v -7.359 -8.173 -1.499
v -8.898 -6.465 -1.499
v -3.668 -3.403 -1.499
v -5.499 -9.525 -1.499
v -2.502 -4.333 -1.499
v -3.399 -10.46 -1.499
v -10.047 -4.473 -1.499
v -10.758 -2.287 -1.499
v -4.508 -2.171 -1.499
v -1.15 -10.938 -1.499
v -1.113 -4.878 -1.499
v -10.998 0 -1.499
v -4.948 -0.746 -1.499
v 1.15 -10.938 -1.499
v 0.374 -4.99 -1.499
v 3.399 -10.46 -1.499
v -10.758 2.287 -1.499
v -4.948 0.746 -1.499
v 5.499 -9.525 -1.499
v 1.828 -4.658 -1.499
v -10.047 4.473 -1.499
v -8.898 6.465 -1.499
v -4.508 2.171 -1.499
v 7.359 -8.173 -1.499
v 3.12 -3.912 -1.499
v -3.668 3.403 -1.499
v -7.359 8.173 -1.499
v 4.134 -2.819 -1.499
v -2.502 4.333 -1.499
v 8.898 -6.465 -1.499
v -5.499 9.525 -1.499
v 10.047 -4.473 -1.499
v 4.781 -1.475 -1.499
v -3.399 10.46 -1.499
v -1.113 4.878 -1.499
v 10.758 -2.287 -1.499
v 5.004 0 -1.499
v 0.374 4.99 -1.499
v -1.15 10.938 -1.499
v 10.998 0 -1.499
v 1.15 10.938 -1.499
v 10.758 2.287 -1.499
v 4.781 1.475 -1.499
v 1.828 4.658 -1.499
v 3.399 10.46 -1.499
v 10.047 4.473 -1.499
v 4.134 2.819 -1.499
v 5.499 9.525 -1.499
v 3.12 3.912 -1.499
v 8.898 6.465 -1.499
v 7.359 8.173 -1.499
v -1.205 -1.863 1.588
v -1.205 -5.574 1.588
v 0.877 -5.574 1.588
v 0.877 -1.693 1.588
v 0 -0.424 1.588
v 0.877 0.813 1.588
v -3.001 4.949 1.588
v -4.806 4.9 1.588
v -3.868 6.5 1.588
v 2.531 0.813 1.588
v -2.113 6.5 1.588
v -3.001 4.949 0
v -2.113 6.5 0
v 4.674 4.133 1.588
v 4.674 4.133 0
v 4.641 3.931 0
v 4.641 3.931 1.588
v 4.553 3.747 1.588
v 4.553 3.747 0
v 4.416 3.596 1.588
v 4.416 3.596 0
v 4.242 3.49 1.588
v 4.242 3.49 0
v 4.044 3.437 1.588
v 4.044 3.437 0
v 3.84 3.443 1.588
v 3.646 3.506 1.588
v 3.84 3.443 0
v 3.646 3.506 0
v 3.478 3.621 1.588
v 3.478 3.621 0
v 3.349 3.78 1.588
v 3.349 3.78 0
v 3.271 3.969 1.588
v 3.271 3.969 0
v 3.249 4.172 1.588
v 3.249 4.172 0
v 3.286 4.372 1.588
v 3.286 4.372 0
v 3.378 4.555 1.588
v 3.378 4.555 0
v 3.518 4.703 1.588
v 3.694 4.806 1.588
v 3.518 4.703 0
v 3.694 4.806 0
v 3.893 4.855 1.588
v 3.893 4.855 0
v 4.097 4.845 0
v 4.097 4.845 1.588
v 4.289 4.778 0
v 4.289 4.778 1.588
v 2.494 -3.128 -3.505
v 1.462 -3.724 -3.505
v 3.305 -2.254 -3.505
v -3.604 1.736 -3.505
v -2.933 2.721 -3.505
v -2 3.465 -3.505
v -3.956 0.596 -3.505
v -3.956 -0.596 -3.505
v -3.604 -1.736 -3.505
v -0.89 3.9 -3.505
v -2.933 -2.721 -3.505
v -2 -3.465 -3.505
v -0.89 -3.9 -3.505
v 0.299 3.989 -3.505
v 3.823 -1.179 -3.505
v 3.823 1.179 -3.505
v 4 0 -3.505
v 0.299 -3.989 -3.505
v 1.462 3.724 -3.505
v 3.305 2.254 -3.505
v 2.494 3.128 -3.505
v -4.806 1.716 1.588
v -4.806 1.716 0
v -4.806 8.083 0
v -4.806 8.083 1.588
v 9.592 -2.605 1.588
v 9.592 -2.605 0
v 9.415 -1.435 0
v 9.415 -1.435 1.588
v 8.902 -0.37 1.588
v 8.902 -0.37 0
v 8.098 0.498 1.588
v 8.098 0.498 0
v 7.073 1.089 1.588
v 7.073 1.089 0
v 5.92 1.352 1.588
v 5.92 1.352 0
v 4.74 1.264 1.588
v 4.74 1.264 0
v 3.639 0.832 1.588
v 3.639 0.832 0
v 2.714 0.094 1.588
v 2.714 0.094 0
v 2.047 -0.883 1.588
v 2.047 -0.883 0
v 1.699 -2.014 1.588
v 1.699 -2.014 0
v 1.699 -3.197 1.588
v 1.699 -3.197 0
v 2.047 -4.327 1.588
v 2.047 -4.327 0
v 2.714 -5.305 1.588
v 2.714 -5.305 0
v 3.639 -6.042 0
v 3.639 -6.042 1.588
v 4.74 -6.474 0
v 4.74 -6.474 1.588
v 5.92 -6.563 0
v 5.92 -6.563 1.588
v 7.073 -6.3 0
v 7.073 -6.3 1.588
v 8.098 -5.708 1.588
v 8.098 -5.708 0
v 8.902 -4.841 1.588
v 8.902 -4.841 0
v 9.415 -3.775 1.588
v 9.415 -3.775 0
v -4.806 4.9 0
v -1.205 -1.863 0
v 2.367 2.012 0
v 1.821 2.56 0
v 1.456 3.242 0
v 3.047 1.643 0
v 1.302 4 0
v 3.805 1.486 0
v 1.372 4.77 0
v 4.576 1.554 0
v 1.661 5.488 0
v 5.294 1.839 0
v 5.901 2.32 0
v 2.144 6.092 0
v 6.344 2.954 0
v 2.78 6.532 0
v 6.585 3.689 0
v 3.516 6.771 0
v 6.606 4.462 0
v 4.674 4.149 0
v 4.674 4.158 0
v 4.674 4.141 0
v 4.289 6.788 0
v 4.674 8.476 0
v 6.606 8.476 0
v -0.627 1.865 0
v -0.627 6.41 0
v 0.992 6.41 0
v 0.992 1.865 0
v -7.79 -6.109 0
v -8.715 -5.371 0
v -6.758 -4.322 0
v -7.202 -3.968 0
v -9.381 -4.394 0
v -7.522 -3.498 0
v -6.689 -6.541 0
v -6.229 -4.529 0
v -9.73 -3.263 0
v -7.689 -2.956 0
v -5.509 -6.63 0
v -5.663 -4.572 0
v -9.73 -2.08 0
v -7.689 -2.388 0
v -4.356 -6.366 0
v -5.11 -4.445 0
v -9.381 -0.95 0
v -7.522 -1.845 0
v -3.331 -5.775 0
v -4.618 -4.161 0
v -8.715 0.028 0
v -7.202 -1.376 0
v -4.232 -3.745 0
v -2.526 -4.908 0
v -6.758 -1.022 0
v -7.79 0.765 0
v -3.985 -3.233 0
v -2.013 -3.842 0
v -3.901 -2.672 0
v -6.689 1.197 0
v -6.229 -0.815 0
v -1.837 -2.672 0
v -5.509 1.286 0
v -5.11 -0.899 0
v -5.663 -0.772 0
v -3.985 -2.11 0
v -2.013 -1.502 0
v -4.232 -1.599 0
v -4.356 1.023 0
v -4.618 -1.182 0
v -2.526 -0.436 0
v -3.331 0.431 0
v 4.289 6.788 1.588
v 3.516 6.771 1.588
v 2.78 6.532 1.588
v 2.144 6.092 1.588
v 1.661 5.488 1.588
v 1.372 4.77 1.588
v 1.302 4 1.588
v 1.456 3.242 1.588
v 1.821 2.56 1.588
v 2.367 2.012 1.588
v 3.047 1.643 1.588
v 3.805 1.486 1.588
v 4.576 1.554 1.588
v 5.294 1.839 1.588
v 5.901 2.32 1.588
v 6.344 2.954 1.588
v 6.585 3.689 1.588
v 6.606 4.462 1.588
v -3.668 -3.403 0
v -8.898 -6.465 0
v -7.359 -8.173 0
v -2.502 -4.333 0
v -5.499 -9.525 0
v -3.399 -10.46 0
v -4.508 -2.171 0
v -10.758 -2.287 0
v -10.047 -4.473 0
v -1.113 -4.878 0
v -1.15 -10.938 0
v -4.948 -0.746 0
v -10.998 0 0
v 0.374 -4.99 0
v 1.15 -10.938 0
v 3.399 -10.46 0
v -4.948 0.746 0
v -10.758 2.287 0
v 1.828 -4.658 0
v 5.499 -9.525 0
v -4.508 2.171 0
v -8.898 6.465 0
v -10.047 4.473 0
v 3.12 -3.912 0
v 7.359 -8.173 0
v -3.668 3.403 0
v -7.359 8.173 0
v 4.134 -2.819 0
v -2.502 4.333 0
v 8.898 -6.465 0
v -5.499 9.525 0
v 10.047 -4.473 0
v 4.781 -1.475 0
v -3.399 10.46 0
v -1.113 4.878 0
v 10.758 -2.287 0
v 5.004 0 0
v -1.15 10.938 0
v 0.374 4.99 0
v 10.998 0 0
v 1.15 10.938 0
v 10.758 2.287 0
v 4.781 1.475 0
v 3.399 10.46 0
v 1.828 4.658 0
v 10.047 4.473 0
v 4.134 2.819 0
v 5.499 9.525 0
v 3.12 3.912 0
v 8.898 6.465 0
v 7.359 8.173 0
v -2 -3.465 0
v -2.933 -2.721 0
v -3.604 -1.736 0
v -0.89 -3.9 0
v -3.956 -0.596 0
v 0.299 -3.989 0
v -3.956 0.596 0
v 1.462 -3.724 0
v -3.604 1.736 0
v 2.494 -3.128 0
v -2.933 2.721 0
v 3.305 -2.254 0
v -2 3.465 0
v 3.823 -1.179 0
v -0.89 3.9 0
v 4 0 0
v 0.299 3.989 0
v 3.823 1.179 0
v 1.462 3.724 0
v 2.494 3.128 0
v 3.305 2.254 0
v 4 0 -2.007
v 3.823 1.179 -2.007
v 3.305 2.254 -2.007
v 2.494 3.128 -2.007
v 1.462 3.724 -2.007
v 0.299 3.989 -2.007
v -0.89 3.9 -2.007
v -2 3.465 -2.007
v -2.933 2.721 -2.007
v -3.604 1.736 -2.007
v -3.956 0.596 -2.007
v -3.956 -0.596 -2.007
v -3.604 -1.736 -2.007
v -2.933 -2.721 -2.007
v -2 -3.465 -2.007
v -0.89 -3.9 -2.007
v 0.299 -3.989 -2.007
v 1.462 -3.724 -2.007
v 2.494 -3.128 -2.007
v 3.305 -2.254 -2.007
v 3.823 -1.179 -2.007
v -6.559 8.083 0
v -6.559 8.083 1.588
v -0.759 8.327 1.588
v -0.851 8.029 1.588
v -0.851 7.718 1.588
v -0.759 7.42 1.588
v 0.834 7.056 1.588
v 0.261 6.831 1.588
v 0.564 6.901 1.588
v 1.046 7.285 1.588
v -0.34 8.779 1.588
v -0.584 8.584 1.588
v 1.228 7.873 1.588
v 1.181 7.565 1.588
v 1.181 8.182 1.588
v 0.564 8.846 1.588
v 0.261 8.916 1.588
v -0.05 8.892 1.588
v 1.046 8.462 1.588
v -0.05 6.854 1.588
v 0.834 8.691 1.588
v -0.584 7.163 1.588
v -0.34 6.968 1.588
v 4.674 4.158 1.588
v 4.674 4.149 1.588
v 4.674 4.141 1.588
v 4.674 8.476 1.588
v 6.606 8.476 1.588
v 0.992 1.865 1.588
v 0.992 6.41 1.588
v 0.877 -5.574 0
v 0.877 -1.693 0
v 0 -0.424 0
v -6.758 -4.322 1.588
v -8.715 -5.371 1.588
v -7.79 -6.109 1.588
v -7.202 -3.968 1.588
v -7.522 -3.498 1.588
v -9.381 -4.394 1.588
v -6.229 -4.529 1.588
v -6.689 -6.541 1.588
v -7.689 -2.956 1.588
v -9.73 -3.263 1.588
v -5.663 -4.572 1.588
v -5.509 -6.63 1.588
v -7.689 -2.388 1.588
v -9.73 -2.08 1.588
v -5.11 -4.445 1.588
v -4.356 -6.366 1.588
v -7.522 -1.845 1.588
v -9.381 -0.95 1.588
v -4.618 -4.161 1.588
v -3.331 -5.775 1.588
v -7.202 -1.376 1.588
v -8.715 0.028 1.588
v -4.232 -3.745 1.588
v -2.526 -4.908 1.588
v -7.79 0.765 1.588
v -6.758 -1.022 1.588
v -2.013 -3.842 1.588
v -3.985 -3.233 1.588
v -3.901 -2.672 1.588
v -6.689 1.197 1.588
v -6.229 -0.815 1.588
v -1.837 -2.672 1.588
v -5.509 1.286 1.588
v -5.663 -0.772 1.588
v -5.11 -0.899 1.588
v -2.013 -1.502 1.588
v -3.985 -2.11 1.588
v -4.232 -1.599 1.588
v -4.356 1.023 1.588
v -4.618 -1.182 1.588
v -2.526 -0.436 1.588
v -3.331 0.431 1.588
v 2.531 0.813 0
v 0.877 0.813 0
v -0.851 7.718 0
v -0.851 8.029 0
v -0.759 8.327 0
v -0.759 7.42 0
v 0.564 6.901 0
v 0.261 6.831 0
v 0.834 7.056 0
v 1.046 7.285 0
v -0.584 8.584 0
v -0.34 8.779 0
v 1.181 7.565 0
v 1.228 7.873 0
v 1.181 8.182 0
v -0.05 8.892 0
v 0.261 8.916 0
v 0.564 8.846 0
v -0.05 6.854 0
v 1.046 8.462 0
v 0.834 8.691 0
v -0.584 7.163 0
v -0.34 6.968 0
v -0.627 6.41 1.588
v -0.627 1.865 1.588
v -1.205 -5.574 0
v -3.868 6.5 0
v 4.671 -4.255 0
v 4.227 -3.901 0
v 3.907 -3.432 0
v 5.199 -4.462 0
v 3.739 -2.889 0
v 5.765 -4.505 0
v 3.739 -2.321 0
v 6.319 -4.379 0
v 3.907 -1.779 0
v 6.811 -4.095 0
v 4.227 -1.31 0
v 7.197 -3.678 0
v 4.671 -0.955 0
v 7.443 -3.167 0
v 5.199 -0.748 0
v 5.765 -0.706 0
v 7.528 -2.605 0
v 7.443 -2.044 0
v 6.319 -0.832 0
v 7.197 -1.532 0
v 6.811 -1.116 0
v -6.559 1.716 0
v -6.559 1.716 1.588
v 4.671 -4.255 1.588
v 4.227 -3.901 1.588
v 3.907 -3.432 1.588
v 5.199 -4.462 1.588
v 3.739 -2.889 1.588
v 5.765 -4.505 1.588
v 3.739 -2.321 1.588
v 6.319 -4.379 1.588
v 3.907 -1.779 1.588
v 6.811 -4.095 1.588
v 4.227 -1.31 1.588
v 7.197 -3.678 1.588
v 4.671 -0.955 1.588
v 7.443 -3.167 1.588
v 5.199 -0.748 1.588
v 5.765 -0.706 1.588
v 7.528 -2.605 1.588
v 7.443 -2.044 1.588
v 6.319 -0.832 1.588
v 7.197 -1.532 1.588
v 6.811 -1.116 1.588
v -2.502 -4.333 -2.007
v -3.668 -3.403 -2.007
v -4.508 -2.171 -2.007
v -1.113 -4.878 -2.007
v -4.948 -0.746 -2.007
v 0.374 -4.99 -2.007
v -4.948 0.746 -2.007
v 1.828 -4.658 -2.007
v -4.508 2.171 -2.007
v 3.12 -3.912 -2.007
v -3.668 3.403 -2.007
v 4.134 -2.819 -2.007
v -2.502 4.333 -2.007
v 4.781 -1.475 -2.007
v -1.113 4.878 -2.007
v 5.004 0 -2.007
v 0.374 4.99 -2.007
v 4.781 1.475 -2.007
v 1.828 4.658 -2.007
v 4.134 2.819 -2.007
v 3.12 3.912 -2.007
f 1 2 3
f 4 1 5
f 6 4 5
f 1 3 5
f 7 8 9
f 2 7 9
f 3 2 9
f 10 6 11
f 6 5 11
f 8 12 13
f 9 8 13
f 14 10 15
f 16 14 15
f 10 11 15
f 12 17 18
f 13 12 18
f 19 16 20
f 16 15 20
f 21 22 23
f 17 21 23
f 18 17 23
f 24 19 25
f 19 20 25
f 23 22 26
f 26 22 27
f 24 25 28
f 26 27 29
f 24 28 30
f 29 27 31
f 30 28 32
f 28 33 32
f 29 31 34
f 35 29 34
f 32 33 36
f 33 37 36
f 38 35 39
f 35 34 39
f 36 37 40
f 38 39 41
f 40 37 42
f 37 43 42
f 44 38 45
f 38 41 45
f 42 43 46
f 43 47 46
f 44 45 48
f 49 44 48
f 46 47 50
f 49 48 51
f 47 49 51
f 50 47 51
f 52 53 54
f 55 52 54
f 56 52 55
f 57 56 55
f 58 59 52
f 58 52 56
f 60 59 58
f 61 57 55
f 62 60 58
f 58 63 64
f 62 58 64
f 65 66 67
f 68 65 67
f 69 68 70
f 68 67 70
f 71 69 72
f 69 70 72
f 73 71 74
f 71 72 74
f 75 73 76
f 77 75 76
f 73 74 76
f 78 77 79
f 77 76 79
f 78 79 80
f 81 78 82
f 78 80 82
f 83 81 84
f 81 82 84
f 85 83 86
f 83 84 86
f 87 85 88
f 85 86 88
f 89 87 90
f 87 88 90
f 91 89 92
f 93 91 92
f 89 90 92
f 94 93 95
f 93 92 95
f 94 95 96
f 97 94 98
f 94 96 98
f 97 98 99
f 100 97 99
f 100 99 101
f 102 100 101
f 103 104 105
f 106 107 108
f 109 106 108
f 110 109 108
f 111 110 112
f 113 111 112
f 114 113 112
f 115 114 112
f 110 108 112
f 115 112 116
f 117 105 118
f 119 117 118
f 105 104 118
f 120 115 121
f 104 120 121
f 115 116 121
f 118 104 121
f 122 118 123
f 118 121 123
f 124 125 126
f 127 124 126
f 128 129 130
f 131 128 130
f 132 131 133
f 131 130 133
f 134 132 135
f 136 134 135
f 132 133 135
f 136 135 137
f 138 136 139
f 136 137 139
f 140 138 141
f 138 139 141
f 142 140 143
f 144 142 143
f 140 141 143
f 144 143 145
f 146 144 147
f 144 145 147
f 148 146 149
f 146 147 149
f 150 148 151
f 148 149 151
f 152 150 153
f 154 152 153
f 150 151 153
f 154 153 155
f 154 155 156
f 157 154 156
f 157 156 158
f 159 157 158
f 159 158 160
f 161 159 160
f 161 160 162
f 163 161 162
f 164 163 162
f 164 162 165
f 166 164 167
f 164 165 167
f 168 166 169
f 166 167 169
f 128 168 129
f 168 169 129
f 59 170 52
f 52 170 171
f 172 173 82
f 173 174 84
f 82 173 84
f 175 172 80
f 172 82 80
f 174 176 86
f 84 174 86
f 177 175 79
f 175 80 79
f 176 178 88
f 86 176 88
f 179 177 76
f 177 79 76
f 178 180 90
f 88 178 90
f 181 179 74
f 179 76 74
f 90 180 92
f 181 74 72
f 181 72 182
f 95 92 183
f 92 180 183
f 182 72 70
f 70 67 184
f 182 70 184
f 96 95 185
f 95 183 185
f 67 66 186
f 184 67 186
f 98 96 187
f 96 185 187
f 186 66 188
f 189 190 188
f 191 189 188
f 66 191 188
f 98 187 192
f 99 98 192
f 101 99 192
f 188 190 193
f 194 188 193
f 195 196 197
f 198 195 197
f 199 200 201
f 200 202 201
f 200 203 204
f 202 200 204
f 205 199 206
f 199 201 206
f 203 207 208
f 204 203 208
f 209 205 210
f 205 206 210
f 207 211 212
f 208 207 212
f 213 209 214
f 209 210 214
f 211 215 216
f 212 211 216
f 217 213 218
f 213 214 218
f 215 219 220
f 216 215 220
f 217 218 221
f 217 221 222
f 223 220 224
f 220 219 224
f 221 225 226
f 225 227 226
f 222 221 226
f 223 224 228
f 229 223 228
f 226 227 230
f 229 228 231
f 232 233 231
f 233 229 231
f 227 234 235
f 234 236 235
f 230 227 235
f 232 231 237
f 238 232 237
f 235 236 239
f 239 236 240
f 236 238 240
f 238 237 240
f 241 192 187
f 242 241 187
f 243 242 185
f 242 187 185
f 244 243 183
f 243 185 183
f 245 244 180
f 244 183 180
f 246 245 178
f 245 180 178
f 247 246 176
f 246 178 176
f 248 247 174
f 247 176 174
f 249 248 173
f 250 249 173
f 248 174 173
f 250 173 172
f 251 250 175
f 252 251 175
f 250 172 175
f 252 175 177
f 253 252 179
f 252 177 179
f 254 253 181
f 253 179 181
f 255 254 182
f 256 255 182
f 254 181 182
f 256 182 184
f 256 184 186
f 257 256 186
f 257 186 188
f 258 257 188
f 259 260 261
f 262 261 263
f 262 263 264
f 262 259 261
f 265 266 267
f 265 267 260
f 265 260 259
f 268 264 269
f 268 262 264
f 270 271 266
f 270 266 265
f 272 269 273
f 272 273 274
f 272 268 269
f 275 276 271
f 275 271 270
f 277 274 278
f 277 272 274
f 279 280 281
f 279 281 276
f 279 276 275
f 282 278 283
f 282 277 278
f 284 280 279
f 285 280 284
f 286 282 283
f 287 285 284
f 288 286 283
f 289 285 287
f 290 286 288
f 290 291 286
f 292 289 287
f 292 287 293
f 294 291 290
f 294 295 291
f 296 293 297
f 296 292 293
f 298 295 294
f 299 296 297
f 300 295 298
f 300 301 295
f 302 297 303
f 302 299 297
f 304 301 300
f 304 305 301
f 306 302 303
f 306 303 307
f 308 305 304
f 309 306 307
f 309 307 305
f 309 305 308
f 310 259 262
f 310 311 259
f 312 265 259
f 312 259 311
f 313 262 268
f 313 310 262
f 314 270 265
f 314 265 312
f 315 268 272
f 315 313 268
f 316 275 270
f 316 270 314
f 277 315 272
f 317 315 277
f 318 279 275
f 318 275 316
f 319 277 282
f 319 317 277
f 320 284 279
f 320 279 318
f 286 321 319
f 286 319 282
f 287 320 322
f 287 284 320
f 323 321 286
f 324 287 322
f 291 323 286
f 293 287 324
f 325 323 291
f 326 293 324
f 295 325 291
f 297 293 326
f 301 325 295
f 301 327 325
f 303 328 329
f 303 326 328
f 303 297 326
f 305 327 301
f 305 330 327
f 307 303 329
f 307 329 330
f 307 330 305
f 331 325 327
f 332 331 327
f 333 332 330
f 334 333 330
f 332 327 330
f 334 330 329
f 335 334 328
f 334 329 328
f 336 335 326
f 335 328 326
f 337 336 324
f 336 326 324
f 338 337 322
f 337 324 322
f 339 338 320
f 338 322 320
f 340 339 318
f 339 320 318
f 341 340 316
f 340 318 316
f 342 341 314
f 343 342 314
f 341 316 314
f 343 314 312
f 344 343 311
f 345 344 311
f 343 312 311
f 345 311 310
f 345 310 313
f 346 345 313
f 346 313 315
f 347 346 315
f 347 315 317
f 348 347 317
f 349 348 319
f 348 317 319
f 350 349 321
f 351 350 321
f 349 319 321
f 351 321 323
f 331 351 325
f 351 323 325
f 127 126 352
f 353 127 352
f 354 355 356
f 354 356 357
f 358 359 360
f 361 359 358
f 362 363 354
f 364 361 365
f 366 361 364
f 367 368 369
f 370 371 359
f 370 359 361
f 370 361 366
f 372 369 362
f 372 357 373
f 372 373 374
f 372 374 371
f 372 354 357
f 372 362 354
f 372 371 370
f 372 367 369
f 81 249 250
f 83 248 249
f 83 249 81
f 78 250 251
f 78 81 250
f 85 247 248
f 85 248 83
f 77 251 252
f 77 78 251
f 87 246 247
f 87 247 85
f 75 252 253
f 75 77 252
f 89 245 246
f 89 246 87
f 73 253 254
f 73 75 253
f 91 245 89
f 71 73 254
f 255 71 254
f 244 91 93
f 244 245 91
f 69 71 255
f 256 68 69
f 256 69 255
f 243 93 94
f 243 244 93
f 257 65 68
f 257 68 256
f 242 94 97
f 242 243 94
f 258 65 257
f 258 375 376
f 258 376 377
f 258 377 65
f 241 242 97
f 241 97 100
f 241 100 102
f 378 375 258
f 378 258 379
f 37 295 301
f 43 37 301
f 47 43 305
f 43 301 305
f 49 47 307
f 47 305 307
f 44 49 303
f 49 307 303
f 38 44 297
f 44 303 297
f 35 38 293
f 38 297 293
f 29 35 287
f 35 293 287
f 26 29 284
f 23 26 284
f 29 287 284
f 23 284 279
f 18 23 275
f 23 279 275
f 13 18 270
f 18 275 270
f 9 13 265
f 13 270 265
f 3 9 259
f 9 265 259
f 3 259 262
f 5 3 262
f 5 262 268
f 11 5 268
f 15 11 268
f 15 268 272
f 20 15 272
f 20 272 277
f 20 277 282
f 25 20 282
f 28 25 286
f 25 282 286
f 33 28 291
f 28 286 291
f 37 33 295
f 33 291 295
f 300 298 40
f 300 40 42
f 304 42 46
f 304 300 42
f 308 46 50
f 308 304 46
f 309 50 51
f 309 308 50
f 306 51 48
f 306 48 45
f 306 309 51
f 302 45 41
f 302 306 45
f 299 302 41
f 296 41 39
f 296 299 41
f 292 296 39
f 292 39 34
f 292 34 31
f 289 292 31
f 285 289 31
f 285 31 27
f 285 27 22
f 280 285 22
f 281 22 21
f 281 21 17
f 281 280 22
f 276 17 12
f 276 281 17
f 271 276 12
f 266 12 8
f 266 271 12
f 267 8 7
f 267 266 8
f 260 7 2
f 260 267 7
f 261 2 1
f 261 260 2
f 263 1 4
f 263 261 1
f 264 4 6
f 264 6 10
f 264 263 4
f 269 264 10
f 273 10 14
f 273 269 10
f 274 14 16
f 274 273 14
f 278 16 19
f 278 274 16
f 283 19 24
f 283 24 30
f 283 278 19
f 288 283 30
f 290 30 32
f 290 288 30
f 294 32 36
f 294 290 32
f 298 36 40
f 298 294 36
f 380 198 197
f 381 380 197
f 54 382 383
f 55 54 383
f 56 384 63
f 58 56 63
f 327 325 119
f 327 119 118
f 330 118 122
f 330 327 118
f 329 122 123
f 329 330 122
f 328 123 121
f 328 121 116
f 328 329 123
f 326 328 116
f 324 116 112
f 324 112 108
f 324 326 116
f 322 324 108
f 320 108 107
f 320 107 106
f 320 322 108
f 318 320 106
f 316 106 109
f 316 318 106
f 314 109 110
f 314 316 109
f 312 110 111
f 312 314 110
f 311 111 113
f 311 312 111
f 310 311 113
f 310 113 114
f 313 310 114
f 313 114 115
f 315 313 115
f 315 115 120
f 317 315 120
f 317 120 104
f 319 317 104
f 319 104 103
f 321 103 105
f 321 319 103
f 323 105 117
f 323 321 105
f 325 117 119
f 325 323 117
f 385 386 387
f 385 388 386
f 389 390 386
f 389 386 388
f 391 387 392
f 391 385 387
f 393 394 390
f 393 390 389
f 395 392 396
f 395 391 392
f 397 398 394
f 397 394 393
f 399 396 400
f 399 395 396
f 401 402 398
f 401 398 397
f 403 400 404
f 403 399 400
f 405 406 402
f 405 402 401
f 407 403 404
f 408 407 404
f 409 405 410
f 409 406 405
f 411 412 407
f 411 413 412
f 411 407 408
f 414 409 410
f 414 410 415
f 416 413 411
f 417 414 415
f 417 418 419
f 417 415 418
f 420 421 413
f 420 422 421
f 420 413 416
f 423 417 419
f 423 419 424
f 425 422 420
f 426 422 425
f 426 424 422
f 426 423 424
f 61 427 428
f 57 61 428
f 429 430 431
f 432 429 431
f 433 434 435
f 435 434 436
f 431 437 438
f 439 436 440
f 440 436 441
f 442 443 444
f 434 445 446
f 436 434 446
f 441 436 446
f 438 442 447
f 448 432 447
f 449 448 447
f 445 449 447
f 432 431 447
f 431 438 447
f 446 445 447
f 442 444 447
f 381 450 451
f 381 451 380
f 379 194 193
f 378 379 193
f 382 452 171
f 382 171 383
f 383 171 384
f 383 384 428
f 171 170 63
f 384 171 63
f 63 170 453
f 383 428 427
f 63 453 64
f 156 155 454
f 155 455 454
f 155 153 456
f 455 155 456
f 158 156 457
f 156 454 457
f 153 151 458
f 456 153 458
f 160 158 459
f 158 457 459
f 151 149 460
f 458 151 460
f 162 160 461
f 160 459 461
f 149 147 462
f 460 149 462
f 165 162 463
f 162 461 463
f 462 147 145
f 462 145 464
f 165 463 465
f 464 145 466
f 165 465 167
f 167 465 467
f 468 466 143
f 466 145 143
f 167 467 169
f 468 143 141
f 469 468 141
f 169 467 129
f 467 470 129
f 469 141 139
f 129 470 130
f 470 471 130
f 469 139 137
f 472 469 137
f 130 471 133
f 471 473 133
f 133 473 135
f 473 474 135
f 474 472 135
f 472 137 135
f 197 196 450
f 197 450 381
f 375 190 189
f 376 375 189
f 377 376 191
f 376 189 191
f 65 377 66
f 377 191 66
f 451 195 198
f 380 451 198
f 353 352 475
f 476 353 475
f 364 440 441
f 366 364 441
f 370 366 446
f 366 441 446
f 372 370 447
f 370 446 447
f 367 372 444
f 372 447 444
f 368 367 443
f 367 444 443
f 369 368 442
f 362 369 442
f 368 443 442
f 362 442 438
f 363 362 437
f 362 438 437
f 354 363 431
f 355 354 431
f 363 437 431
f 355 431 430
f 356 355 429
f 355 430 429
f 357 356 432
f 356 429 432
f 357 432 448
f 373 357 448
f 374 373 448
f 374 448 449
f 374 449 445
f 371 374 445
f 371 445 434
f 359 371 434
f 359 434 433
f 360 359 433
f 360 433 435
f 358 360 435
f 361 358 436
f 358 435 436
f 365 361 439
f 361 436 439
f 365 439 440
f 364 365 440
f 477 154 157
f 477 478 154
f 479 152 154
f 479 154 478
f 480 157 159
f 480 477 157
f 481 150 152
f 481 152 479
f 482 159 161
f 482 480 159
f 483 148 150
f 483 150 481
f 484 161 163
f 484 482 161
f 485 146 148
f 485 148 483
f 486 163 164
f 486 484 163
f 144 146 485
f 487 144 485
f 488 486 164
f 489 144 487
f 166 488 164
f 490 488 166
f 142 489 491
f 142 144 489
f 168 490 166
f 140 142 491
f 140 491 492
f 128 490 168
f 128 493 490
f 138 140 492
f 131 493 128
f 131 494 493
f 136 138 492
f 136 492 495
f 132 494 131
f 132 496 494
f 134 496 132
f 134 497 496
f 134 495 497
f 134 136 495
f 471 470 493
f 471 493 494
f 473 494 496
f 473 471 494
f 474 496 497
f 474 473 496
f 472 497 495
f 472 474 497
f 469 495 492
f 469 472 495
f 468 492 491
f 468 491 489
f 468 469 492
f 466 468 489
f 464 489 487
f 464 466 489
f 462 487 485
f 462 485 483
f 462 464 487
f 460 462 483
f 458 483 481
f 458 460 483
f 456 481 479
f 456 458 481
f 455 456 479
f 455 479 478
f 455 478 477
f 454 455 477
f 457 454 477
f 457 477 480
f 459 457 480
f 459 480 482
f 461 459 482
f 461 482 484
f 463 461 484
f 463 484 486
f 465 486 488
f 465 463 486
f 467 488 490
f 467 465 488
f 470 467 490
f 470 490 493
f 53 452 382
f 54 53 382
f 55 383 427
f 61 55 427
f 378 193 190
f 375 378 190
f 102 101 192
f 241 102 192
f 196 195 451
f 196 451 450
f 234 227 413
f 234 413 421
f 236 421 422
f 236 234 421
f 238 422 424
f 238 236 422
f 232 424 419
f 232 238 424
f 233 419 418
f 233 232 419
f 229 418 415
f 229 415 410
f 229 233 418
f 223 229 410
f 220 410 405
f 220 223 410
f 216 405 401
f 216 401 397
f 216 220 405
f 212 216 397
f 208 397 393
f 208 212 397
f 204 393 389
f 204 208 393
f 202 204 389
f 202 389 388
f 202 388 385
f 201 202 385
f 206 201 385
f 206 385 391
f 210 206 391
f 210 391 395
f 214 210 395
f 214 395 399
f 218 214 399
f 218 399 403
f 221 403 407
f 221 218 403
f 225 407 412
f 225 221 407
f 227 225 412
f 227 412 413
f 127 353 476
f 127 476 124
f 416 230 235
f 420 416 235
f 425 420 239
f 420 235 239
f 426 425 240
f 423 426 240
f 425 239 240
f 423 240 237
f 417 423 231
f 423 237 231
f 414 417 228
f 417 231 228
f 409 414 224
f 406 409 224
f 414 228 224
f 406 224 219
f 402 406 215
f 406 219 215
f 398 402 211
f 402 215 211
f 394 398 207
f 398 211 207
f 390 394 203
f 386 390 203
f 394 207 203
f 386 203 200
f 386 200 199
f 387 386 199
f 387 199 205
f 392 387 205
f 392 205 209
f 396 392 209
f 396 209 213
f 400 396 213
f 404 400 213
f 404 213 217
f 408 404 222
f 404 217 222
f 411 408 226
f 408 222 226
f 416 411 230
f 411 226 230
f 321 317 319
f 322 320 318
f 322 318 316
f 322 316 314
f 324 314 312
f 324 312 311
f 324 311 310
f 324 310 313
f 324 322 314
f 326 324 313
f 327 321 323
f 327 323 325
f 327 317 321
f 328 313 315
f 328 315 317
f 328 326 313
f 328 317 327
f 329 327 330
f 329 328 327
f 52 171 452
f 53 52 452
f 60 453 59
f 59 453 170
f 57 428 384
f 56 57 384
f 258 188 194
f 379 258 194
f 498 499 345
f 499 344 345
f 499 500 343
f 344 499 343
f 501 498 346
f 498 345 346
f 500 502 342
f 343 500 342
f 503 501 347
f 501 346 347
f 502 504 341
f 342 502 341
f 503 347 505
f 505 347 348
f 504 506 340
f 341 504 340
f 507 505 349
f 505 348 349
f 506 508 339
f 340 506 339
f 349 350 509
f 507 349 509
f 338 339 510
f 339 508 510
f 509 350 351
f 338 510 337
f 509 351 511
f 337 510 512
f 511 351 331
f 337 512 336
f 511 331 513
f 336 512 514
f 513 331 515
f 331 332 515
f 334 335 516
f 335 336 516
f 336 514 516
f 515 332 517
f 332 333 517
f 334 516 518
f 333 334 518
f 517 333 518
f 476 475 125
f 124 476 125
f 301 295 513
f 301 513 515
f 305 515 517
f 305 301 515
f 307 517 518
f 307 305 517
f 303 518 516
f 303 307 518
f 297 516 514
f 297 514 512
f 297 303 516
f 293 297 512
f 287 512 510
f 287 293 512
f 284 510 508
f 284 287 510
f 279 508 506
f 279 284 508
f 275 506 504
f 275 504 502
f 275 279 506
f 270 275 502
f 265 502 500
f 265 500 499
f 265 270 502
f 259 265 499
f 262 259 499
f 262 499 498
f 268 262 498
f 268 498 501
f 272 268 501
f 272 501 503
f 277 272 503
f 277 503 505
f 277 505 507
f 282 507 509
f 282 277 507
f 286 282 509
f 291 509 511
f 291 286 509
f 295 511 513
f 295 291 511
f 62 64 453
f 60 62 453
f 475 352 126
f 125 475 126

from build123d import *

# Parameters (mm, degrees)
F0_R     = 10.9982
F0_R_2   = 5.0038
F1_DEPTH = 1.4986
F0_R_3   = 4.0005
F2_DEPTH = 2.0066
F3_DEPTH = 3.5052
F5_DEPTH = 1.27
F4_W     = 1.2951166562
F4_H     = 3.6354111349
F4_R     = 0.8361544211
F4_R_2   = 3.175
F4_R_3   = 1.524
F6_SCALE = 1.25


with BuildPart() as f1:
    # F0 (on Top) → F1 (new body)
    with BuildSketch(Plane.XY):
        Circle(F0_R)
        Circle(F0_R_2, mode=Mode.SUBTRACT)
    extrude(amount=-F1_DEPTH)


with BuildPart() as f2:
    # F0 (on Top) → F2 (new body)
    with BuildSketch(Plane.XY):
        Circle(F0_R_2)
        Circle(F0_R_3, mode=Mode.SUBTRACT)
    extrude(amount=-F2_DEPTH)


with BuildPart() as f3:
    # F0 (on Top) → F3 (new body)
    with BuildSketch(Plane.XY):
        Circle(F0_R_3)
    extrude(amount=-F3_DEPTH)


with BuildPart() as f5:
    # F4 (on Top) → F5 (new body)
    with BuildSketch(Plane.XY):
        Polygon((-0.9639669859, -1.4903870741), (-0.9639669859, -4.4593061392), (0.7013171111, -4.4593061392), (0.7013171111, -1.3541933216), (2.0251488681, 0.6504660684), (0.7013171111, 0.6504660684), (0, -0.3391735764), (-2.401197562, 3.9588166401), (-1.6904811083, 5.1996577531), (-3.0943236873, 5.1996577531), (-3.8450609427, 3.9197136648), align=None)
    extrude(amount=F5_DEPTH)


with BuildPart() as f5b:
    # F4 (on Top) → F5, piece 2 (new body)
    with BuildSketch(Plane.XY):
        Polygon((-3.8450609427, 1.3726343814), (-3.8450609427, 3.9197136648), (-3.8450609427, 6.4667929482), (-5.2475911869, 6.4667929482), (-5.2475911869, 1.3726343814), align=None)
    extrude(amount=F5_DEPTH)


with BuildPart() as f5c:
    # F4 (on Top) → F5, piece 3 (new body)
    with BuildSketch(Plane.XY):
        with Locations((0.1460003935, 3.3100993147)):
            Rectangle(F4_W, F4_H)
    extrude(amount=F5_DEPTH)


with BuildPart() as f5d:
    # F4 (on Top) → F5, piece 4 (new body)
    with BuildSketch(Plane.XY):
        with Locations((0.1460003935, 6.2987548299)):
            Circle(F4_R)
    extrude(amount=F5_DEPTH)


with BuildPart() as f5e:
    # F4 (on Top) → F5, piece 5 (new body)
    with BuildSketch(Plane.XY):
        with Locations((-4.644471146, -2.1374930238)):
            Circle(F4_R_2)
        with Locations((-4.644471146, -2.1374930238)):
            Circle(F4_R_3, mode=Mode.SUBTRACT)
    extrude(amount=F5_DEPTH)


with BuildPart() as f5f:
    # F4 (on Top) → F5, piece 6 (new body)
    with BuildSketch(Plane.XY):
        with Locations((4.4984421693, -2.0841928199)):
            Circle(F4_R_2)
        with Locations((4.4984421693, -2.0841928199)):
            Circle(F4_R_3, mode=Mode.SUBTRACT)
    extrude(amount=F5_DEPTH)


with BuildPart() as f5g:
    # F4 (on Top) → F5, piece 7 (new body)
    with BuildSketch(Plane.XY):
        with BuildLine():
            Line((3.4315840051, 3.822441707), (3.4315840051, 5.4306069392))
            ThreePointArc((3.4315840051, 5.4306069392), (1.6593378456, 1.8125938265), (5.2846923269, 3.5697734468))
            Line((5.2846923269, 3.5697734468), (5.2846923269, 6.7809580791))
            Line((5.2846923269, 6.7809580791), (3.7393509245, 6.7809580791))
            Line((3.7393509245, 6.7809580791), (3.7393509245, 5.3691130042))
            Line((3.7393509245, 5.3691130042), (3.7393509245, 3.3260008253))
            ThreePointArc((3.7393509245, 3.3260008253), (3.7394367375, 3.3161076992), (3.7393509245, 3.3062145731))
            ThreePointArc((3.7393509245, 3.3062145731), (2.6792539887, 3.0240571788), (3.4315840051, 3.822441707))
        make_face()
    extrude(amount=F5_DEPTH)


with BuildPart() as f5b_1:
    # F6: moved
    add(f5b.part.scale(F6_SCALE))


with BuildPart() as f5_1:
    # F6: moved
    add(f5.part.scale(F6_SCALE))


with BuildPart() as f5c_1:
    # F6: moved
    add(f5c.part.scale(F6_SCALE))


with BuildPart() as f5d_1:
    # F6: moved
    add(f5d.part.scale(F6_SCALE))


with BuildPart() as f5g_1:
    # F6: moved
    add(f5g.part.scale(F6_SCALE))


with BuildPart() as f5f_1:
    # F6: moved
    add(f5f.part.scale(F6_SCALE))


with BuildPart() as f5e_1:
    # F6: moved
    add(f5e.part.scale(F6_SCALE))


solid = Compound([f1.part, f2.part, f3.part, f5b_1.part, f5_1.part, f5c_1.part, f5d_1.part, f5g_1.part, f5f_1.part, f5e_1.part])
